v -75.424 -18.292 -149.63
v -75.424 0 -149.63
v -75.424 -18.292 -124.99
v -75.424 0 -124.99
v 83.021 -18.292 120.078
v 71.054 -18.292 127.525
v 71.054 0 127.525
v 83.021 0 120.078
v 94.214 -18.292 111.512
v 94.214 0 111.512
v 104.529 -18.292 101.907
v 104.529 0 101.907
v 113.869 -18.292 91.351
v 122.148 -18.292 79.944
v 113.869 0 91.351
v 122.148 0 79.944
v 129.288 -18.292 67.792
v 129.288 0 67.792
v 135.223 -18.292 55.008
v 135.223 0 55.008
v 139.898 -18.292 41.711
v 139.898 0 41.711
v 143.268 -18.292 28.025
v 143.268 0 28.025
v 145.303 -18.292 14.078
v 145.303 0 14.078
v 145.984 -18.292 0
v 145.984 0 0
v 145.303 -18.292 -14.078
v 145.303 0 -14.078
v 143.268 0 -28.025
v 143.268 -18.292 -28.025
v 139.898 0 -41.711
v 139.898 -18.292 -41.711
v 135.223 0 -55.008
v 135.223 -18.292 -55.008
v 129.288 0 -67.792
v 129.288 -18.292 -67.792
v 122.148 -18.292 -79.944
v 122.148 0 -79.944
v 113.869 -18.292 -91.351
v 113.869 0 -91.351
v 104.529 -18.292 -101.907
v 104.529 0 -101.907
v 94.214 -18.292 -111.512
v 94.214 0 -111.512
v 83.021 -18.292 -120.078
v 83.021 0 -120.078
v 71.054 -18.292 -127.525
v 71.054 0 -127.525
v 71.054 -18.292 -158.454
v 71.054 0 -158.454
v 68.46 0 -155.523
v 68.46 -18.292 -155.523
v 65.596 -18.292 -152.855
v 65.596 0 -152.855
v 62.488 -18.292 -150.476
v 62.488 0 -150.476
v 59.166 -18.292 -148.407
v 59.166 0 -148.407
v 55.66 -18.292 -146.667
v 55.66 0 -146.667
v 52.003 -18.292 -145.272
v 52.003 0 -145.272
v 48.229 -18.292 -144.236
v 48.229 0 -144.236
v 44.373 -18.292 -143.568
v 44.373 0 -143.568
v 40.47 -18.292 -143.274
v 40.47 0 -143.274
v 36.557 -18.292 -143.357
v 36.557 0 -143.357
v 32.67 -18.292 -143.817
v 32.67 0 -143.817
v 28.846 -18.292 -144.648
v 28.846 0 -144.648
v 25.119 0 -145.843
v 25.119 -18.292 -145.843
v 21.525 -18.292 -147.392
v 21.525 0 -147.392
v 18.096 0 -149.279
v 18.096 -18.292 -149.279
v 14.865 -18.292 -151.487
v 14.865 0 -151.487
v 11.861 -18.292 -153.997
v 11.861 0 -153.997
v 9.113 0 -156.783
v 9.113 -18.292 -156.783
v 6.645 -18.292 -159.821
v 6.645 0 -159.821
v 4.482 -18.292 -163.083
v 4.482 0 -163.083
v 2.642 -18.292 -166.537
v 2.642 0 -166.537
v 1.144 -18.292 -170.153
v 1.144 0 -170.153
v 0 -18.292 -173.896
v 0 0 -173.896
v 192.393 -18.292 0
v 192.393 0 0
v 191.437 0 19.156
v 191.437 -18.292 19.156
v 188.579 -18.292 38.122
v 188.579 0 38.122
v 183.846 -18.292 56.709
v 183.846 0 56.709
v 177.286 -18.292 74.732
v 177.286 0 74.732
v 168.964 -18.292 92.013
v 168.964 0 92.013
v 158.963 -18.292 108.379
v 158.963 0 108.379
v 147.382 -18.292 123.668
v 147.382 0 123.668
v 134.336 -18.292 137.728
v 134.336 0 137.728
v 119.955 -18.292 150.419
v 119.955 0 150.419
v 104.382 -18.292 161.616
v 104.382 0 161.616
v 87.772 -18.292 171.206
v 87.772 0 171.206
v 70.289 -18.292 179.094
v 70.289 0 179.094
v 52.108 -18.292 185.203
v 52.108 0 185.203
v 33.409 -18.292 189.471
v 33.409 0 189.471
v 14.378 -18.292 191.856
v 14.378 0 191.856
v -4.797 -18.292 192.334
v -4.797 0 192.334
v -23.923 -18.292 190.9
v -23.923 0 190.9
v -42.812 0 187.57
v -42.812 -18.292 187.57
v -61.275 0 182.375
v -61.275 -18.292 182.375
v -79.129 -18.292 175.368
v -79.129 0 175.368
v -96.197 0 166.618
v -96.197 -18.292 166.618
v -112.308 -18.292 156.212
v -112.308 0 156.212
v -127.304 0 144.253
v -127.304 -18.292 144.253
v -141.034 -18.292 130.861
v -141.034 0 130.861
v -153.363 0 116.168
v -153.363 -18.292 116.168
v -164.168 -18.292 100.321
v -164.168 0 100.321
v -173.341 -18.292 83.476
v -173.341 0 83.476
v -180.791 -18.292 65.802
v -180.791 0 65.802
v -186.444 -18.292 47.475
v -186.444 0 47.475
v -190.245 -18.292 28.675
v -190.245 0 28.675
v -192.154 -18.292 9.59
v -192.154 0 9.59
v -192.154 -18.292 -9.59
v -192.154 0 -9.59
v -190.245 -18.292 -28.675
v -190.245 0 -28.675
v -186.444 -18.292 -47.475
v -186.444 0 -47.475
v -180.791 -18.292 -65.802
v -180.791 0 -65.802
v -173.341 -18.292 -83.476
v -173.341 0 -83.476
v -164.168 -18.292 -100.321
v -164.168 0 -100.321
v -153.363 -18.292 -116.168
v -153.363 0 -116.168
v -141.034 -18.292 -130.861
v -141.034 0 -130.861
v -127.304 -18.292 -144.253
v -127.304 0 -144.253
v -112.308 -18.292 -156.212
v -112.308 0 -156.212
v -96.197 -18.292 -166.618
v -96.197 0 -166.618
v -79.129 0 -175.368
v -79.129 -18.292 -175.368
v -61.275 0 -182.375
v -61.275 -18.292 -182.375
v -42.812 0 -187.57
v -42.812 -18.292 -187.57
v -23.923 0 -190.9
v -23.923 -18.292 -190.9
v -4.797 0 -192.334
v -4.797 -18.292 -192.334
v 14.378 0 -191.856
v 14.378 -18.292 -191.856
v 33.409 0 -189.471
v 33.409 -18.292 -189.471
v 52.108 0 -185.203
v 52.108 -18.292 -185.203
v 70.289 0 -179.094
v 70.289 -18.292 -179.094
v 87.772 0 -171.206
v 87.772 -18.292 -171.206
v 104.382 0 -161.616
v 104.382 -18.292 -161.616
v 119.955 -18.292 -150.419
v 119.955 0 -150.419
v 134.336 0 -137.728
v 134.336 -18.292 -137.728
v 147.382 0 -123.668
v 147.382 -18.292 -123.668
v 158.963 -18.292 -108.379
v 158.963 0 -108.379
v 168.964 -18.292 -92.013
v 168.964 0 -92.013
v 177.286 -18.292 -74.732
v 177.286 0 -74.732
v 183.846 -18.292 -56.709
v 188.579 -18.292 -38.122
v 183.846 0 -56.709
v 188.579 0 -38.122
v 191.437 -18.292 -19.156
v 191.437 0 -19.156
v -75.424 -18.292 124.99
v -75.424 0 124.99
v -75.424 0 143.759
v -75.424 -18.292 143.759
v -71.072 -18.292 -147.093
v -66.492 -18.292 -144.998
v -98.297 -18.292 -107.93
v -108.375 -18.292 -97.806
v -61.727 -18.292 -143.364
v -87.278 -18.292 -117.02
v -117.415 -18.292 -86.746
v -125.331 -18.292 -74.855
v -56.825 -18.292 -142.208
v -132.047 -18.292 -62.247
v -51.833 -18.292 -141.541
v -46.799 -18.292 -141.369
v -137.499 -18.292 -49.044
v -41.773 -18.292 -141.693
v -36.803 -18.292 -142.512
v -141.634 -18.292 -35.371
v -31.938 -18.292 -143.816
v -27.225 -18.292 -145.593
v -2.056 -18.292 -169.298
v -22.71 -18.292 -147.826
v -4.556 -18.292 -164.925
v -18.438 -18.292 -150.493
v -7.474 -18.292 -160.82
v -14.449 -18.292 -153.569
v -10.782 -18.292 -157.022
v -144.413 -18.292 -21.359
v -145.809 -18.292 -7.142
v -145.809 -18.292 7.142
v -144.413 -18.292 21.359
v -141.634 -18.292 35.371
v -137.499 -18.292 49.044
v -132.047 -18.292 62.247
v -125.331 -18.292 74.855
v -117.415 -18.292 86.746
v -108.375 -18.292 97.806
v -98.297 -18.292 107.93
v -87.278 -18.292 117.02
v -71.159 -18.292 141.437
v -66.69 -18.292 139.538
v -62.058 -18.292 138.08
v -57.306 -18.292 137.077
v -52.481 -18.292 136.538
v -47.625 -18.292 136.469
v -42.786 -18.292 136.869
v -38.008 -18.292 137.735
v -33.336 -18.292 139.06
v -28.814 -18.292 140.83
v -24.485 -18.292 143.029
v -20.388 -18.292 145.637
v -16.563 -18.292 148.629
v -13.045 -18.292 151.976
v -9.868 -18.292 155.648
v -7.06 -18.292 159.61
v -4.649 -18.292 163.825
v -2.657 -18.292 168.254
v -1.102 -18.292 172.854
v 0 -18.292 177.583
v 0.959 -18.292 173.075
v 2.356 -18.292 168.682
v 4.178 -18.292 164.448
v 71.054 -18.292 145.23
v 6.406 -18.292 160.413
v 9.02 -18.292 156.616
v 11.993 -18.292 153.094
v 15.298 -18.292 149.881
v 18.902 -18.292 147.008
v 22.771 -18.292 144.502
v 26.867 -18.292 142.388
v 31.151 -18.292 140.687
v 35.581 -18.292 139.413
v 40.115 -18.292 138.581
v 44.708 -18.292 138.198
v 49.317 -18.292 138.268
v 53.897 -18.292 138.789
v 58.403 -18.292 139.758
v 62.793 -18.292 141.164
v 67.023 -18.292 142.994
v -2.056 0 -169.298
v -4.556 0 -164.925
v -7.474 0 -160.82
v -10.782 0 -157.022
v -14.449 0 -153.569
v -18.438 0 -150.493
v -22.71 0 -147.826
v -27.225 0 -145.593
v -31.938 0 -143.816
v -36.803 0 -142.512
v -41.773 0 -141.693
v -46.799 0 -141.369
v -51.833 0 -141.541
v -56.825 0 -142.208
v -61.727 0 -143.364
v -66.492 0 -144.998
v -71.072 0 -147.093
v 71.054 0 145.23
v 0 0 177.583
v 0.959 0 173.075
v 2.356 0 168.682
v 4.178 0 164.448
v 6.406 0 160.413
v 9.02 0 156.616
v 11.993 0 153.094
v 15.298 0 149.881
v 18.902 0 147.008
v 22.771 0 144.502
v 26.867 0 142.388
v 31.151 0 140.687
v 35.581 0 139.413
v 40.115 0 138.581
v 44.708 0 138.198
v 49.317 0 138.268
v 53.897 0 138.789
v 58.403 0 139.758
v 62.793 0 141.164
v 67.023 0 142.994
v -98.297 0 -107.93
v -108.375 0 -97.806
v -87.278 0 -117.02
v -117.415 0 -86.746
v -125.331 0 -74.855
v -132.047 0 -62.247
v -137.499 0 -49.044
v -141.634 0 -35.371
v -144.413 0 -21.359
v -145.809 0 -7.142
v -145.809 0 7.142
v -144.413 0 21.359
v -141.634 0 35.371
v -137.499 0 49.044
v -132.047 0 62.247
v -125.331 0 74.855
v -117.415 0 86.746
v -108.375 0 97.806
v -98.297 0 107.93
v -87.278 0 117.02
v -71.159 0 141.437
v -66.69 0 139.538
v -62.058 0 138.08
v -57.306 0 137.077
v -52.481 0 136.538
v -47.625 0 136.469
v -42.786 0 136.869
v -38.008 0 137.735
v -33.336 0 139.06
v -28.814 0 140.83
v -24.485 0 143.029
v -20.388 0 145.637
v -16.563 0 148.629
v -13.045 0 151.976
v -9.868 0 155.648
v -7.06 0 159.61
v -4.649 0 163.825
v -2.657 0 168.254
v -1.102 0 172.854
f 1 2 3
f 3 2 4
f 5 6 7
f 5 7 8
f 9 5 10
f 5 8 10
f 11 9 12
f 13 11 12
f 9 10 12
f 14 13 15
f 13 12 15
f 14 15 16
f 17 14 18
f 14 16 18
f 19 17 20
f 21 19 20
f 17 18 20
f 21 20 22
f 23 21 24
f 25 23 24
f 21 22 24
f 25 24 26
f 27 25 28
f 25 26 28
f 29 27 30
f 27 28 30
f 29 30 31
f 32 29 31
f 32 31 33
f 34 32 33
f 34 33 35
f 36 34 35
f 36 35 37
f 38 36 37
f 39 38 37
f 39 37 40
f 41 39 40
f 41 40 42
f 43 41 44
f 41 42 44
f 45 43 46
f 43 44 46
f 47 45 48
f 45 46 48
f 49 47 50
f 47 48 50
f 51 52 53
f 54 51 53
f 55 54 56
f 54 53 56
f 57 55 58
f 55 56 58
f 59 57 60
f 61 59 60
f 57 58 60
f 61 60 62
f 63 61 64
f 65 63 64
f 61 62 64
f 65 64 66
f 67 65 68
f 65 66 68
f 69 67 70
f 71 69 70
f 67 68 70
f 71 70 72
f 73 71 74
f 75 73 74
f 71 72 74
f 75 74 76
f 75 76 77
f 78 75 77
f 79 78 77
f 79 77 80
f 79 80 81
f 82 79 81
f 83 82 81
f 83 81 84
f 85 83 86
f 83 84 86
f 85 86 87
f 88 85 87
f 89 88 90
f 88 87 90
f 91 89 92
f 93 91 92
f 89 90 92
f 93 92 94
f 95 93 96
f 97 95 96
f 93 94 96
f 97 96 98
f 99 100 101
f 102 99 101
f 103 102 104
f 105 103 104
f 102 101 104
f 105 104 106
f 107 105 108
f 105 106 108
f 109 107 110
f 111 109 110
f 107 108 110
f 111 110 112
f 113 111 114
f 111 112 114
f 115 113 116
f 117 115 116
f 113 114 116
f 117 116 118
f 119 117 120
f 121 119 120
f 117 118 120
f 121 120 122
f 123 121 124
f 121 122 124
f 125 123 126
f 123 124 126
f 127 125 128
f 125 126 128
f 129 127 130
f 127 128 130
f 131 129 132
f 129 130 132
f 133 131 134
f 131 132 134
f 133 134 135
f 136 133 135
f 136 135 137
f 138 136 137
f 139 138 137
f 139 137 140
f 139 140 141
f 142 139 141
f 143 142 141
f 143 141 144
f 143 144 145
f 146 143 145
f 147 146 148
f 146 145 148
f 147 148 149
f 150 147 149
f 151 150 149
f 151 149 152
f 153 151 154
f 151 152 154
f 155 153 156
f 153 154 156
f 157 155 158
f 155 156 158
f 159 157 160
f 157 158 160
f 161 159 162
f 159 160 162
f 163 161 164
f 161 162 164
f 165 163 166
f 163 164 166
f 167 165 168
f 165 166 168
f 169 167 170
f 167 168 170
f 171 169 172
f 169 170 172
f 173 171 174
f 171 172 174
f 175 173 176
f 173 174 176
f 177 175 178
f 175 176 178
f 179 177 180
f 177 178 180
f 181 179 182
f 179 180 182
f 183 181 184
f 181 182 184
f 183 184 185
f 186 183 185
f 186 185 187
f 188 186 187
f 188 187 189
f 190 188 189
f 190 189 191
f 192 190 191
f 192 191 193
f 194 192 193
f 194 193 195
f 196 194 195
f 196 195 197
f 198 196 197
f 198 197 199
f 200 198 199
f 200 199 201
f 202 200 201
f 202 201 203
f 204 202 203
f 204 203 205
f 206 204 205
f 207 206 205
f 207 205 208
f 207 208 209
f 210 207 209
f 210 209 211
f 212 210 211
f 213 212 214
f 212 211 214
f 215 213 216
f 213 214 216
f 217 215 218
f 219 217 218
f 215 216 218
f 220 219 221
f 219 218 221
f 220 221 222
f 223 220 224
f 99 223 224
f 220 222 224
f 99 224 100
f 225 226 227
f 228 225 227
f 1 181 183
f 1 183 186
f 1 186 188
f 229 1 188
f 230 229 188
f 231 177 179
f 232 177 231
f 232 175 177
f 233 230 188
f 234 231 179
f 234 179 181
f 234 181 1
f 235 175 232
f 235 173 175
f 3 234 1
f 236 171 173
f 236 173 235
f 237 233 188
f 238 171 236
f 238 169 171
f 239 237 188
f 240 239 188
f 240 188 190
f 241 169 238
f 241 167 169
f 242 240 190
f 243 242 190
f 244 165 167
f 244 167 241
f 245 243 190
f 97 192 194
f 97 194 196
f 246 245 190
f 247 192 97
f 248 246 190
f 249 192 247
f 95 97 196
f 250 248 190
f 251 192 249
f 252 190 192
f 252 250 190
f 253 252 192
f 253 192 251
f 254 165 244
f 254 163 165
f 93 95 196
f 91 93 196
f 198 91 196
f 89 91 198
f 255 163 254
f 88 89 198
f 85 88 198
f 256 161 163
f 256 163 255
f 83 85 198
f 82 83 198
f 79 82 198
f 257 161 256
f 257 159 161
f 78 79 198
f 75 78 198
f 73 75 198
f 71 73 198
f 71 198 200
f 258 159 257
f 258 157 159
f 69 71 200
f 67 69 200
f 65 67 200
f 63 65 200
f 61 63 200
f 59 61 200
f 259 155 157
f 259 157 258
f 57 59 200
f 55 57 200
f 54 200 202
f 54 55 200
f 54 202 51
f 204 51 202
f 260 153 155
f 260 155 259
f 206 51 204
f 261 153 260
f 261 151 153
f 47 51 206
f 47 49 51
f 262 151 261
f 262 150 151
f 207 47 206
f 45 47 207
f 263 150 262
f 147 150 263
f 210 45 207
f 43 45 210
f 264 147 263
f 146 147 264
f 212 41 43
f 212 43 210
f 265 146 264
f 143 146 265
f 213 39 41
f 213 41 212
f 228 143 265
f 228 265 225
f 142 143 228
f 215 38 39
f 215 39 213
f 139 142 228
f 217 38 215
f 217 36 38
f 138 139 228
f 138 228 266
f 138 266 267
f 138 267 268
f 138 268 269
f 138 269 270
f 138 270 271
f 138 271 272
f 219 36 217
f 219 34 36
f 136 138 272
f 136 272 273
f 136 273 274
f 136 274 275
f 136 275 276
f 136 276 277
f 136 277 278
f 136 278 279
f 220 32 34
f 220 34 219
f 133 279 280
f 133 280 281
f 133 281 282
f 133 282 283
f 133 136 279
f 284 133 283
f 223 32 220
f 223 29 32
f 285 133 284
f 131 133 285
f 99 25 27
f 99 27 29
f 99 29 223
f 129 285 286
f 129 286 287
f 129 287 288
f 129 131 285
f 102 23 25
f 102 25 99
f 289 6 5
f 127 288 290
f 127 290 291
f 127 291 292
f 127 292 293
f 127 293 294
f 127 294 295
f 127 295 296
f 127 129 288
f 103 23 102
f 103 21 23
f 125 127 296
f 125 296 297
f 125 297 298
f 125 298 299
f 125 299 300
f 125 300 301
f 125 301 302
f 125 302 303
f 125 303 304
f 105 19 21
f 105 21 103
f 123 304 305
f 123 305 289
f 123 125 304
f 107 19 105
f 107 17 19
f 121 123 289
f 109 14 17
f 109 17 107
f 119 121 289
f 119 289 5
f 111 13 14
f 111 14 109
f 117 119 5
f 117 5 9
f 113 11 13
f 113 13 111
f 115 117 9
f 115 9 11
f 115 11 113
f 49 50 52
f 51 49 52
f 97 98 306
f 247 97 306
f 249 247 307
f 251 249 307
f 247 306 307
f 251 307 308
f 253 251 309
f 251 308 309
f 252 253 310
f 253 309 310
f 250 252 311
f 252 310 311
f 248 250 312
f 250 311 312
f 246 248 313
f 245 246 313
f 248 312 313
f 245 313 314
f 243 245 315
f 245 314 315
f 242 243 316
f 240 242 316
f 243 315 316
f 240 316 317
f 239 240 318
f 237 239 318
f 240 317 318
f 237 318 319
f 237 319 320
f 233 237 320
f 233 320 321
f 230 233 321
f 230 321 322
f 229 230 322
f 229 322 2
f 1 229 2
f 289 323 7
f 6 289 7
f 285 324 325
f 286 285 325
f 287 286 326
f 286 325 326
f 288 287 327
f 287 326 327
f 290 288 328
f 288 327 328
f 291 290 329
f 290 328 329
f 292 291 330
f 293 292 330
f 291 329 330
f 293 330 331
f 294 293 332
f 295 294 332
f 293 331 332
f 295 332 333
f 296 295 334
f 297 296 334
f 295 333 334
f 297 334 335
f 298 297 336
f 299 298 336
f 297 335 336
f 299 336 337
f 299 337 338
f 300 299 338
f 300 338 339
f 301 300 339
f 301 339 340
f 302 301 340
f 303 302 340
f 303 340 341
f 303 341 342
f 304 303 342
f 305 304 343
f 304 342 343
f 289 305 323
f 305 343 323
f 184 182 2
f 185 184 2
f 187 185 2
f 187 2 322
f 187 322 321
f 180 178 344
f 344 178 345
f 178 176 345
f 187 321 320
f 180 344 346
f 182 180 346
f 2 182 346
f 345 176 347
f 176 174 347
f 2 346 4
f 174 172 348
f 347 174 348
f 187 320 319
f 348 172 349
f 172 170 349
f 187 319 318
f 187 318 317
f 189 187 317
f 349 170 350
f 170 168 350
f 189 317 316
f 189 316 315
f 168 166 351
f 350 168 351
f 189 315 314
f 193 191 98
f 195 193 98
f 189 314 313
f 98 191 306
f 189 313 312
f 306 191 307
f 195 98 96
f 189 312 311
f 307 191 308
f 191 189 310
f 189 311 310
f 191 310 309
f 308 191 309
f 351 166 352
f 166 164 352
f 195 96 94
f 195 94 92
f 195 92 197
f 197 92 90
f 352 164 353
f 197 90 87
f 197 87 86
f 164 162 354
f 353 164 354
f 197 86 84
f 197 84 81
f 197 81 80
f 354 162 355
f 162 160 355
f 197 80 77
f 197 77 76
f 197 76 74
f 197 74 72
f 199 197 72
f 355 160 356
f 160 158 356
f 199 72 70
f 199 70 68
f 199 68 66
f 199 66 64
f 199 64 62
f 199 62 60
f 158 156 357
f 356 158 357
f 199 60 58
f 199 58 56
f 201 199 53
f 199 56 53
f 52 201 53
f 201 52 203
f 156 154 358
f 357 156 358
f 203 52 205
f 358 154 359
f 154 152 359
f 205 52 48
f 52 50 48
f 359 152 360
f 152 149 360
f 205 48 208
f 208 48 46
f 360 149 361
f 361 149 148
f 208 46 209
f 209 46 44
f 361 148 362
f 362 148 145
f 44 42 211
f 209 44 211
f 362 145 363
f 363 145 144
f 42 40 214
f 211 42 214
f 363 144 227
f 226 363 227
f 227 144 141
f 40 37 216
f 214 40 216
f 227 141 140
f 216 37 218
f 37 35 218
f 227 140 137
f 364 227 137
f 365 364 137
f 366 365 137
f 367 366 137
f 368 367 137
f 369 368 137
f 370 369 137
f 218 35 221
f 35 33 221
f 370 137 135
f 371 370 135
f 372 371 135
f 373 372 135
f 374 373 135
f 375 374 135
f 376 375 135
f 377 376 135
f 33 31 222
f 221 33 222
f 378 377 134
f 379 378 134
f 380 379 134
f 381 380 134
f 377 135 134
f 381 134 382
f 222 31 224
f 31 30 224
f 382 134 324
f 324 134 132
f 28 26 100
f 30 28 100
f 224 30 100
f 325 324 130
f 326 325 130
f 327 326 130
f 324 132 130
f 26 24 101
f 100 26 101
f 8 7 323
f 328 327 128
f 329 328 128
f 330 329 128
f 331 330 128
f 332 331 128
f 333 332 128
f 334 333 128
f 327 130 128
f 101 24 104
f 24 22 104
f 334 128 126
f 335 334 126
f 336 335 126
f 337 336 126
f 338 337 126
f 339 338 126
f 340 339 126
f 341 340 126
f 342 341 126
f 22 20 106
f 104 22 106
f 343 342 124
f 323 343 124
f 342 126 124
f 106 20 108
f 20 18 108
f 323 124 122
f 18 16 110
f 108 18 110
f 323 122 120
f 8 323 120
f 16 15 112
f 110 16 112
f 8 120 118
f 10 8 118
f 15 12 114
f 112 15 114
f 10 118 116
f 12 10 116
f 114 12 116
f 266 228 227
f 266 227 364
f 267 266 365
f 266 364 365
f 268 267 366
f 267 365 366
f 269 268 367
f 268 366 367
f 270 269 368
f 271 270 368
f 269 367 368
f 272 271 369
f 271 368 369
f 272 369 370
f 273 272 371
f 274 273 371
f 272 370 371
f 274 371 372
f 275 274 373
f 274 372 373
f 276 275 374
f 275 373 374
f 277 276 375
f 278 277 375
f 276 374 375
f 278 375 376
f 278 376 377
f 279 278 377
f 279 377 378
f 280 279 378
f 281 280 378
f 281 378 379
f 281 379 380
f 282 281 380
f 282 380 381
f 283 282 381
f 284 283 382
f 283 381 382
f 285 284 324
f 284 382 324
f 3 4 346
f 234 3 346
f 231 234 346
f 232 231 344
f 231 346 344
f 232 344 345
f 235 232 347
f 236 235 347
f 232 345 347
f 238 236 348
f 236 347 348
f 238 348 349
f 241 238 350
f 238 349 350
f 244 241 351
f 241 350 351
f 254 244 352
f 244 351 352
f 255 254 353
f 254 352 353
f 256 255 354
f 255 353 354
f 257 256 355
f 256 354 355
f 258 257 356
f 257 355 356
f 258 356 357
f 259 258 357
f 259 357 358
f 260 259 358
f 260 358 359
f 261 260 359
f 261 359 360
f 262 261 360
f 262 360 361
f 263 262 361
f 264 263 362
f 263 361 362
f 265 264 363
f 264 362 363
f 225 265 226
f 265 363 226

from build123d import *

# Parameters (mm, degrees)
F0_R     = 192.393498
F1_DEPTH = 18.29249


with BuildPart() as f1:
    # F0 (on Front) → F1 (new body)
    with BuildSketch(Plane.XZ):
        Circle(F0_R)
        with BuildLine():
            ThreePointArc((-75.423603, -124.989932), (-145.983571, 0), (-75.423603, 124.989932))
            Line((-75.423603, 124.989932), (-75.423603, 143.759063))
            ThreePointArc((-75.423603, 143.759063), (-28.813946, 140.830175), (0, 177.583337))
            ThreePointArc((0, 177.583337), (26.867171, 142.388247), (71.053845, 145.230274))
            Line((71.053845, 145.230274), (71.053845, 127.52472))
            ThreePointArc((71.053845, 127.52472), (145.983571, 0), (71.053845, -127.52472))
            Line((71.053845, -127.52472), (71.053845, -150.177163))
            Line((71.053845, -150.177163), (71.053845, -158.453529))
            ThreePointArc((71.053845, -158.453529), (30.748142, -144.186111), (0, -173.895717))
            ThreePointArc((0, -173.895717), (-31.937801, -143.816001), (-75.423603, -149.629557))
            Line((-75.423603, -149.629557), (-75.423603, -124.989932))
        make_face(mode=Mode.SUBTRACT)
    extrude(amount=F1_DEPTH)


solid = f1.part
